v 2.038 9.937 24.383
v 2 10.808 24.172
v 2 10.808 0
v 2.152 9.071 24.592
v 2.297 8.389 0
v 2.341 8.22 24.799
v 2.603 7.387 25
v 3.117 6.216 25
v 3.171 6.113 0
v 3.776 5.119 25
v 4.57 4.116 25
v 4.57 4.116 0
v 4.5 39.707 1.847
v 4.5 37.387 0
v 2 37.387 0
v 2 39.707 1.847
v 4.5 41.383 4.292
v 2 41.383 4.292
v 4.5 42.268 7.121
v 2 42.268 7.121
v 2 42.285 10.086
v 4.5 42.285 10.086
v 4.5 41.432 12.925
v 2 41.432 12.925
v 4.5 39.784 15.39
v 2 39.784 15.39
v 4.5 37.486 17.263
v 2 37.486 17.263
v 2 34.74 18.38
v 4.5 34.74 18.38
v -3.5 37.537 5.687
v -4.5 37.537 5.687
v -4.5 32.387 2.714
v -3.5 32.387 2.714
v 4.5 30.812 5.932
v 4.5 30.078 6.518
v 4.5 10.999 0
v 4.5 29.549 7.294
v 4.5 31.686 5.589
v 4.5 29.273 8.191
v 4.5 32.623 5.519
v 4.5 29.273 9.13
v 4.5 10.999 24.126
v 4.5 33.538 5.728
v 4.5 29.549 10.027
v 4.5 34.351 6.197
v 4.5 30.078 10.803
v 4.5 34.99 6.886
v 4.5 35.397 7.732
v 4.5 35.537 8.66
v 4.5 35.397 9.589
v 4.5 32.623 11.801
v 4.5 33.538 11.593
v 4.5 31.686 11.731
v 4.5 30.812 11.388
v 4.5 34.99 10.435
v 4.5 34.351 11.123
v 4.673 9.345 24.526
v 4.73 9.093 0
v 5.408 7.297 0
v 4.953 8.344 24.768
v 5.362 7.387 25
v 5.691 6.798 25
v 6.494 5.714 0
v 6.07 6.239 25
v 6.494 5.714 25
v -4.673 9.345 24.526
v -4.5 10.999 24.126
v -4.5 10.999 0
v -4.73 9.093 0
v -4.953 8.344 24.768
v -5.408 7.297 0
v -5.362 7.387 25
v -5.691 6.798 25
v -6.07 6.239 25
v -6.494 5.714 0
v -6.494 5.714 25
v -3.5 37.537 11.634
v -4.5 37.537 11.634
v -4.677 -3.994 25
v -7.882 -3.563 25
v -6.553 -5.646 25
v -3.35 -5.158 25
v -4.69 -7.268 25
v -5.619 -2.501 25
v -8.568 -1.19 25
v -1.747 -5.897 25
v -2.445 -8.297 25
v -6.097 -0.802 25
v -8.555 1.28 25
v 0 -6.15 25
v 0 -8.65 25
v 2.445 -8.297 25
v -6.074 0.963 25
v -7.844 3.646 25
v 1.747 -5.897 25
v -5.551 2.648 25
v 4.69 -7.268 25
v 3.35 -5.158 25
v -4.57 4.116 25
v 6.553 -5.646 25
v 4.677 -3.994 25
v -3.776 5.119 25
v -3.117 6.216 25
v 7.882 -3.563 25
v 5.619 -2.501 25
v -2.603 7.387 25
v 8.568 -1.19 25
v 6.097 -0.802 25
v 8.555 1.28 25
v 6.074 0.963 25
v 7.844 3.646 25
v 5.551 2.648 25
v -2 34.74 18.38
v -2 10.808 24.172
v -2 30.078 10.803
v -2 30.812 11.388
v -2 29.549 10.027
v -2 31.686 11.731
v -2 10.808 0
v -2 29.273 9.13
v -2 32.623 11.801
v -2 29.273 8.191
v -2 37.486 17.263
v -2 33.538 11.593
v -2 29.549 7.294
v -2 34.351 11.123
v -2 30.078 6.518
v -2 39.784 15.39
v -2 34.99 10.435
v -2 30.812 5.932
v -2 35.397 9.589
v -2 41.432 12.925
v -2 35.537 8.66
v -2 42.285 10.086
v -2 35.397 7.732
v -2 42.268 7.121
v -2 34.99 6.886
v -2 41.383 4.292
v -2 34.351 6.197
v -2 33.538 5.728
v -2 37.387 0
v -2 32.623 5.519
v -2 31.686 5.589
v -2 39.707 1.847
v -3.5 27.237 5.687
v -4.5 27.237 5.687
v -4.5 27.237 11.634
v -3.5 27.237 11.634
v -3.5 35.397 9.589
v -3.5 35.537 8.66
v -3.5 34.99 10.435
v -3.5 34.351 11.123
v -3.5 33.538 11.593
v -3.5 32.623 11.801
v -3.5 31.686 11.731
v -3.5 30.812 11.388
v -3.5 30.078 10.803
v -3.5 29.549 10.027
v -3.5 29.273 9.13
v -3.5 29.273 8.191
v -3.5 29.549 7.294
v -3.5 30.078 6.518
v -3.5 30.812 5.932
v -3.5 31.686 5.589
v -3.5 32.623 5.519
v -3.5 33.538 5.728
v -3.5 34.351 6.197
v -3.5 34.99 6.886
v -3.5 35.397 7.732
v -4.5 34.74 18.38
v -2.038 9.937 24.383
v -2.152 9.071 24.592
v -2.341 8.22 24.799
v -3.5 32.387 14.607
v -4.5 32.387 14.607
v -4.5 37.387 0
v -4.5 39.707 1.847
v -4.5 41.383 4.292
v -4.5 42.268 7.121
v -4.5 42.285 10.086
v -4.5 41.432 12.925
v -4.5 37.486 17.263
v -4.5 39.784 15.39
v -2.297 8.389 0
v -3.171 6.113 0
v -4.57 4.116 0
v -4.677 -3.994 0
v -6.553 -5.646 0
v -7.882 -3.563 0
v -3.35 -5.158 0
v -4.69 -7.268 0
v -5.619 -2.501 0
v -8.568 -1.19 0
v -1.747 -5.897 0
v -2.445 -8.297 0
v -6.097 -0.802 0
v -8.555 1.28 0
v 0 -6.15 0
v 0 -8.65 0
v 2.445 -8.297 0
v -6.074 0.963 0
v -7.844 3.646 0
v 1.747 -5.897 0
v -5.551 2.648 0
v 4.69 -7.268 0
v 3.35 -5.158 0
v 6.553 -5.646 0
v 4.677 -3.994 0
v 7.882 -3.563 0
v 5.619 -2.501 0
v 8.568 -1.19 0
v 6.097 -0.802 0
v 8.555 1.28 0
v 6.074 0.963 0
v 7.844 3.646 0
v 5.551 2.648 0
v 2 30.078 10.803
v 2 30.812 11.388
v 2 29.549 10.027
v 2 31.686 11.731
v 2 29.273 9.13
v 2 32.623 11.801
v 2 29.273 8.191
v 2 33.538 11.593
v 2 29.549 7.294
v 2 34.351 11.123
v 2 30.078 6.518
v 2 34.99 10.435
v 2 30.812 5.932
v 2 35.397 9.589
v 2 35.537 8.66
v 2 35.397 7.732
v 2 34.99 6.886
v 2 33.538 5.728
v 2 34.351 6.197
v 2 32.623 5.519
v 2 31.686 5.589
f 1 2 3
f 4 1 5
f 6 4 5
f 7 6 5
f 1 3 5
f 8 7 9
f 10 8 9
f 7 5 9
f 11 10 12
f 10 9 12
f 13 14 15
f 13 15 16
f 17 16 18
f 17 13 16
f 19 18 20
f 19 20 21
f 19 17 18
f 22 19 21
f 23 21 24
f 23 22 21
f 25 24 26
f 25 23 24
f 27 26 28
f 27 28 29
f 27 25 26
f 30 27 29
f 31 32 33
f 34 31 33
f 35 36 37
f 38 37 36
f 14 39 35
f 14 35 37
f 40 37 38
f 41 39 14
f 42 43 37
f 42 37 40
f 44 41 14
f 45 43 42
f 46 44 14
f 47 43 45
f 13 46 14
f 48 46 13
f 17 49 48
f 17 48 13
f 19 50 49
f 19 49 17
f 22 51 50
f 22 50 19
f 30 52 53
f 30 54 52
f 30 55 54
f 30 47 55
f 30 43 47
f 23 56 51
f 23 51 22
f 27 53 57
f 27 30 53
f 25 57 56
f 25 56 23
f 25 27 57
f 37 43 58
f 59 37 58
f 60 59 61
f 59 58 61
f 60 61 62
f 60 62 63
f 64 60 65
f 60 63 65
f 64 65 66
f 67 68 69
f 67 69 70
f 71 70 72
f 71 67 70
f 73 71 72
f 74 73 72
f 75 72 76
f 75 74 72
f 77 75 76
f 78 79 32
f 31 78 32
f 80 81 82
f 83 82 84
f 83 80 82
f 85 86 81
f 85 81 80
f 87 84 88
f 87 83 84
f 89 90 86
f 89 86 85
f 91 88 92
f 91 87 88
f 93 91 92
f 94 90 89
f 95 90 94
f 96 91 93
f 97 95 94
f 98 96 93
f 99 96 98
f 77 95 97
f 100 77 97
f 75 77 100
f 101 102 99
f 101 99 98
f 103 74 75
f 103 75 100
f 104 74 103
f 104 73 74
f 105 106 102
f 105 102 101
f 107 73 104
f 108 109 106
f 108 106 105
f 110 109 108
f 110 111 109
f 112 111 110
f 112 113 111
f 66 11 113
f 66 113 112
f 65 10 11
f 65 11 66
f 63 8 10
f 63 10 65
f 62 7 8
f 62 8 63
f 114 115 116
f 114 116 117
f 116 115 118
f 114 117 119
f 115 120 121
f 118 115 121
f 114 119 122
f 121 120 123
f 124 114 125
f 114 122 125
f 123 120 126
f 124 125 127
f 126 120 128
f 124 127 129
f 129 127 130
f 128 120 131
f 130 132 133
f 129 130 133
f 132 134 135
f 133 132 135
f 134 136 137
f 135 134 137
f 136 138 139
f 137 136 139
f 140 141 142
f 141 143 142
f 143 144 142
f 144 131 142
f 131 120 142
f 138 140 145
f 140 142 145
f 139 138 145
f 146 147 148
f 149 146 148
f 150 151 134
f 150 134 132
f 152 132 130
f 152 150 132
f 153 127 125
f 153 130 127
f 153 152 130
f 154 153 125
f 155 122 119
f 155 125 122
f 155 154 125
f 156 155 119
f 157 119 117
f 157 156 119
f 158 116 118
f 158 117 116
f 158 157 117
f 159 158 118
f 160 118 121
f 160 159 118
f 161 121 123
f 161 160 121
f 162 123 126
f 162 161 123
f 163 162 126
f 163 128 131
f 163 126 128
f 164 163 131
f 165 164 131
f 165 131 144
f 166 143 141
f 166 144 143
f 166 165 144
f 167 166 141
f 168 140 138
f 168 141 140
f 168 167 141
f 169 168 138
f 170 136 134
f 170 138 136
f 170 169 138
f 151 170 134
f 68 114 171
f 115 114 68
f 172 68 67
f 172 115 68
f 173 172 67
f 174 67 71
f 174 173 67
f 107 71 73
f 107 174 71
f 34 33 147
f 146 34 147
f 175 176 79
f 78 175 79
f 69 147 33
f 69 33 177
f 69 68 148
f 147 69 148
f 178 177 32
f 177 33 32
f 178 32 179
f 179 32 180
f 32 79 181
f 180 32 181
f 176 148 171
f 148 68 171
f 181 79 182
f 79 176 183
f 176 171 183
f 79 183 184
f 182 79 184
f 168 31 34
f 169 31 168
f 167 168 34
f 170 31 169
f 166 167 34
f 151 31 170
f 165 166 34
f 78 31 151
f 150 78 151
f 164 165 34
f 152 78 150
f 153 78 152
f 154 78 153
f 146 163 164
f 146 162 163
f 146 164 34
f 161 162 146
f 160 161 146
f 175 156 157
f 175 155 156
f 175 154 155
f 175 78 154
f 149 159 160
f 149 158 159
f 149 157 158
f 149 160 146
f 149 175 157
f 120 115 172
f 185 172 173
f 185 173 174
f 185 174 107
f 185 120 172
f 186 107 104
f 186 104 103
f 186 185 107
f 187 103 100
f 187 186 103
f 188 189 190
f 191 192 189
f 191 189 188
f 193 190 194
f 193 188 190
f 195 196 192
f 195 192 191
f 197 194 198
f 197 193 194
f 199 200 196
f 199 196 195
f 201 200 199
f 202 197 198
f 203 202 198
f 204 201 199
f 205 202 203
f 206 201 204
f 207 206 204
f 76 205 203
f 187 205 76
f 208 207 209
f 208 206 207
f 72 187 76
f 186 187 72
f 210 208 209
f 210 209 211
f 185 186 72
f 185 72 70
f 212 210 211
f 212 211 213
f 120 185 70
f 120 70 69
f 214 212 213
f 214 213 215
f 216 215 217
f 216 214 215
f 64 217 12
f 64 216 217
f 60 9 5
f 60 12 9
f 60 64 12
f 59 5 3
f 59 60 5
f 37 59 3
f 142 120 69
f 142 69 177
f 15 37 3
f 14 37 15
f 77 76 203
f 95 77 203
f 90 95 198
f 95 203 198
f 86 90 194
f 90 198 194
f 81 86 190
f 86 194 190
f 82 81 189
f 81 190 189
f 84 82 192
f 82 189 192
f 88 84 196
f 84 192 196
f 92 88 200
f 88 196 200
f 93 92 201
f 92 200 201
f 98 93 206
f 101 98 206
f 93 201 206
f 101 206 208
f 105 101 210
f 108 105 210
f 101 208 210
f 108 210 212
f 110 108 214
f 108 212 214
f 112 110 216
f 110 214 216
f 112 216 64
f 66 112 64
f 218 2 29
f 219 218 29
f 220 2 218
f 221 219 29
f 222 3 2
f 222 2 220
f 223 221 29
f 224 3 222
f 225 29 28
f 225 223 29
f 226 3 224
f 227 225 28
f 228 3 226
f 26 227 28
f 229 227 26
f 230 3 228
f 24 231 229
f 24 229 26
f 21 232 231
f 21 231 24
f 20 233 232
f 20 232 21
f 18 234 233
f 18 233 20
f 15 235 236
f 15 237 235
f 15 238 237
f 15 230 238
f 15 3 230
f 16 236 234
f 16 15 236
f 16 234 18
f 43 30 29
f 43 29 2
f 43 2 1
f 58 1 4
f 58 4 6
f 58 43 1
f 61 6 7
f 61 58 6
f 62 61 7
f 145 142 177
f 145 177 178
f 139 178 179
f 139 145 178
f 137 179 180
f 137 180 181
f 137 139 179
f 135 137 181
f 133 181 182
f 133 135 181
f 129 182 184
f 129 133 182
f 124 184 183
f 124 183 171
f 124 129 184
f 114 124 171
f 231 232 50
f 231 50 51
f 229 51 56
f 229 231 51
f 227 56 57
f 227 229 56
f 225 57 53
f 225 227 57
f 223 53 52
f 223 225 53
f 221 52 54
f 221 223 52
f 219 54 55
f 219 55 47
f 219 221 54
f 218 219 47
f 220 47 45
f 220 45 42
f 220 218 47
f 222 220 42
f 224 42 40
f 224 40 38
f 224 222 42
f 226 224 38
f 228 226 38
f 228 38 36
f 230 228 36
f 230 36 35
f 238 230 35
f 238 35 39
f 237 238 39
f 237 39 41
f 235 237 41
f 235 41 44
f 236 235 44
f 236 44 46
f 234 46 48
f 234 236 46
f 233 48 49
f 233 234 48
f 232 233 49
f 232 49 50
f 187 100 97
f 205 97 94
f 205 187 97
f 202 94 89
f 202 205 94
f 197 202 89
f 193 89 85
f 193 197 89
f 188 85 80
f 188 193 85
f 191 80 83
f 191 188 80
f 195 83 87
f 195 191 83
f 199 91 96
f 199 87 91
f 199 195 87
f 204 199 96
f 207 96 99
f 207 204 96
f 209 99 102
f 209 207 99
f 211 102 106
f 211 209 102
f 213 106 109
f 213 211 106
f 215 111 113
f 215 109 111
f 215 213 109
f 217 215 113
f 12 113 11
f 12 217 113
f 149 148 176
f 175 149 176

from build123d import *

# Parameters (mm, degrees)
F0_R     = 6.15
F1_DEPTH = 25
F2_R     = 3.15
F3_DEPTH = 4.5
F4_W     = 4
F4_H     = 43.2851596258
F5_DEPTH = 25.001
F6_R     = 8
F7_R     = 10
F8_R     = 3.15
F9_DEPTH = 1


with BuildPart() as f1:
    # F0 (on Top) → F1 (new body)
    with BuildSketch(Plane.XY):
        with BuildLine():
            Line((4.5, 7.3873202178), (-4.5, 7.3873202178))
            ThreePointArc((-4.5, 7.3873202178), (0, -8.65), (4.5, 7.3873202178))
        make_face()
        Circle(F0_R, mode=Mode.SUBTRACT)
    extrude(amount=F1_DEPTH)

    # F2 (on Right) → F3 (join, symmetric)
    with BuildSketch(Plane.YZ):
        with BuildLine():
            Line((34.739792331, 18.3796097241), (7.3873202178, 25))
            Line((7.3873202178, 25), (7.3873202178, 0))
            Line((7.3873202178, 0), (37.3873202178, 0))
            ThreePointArc((37.3873202178, 0), (42.2851596258, 10.0860082429), (34.739792331, 18.3796097241))
        make_face()
        with Locations((32.3873202178, 8.6602540378)):
            Circle(F2_R, mode=Mode.SUBTRACT)
    extrude(amount=F3_DEPTH, both=True)

    # F4 (on Top) → F5 (cut, through all)
    with BuildSketch(Plane.XY):
        with Locations((0, 21.6425798129)):
            Rectangle(F4_W, F4_H)
    extrude(amount=F5_DEPTH, mode=Mode.SUBTRACT)

    # F6
    f6_edges = [f1.edges().sort_by_distance(p)[0] for p in [
        (4.5, 7.38732, 12.5),
        (-4.5, 7.38732, 12.5),
    ]]
    fillet(f6_edges, radius=F6_R)

    # F7
    f7_edges = [f1.edges().sort_by_distance(p)[0] for p in [
        (-2, 5.815711, 12.5),
        (2, 5.815711, 12.5),
    ]]
    fillet(f7_edges, radius=F7_R)

    # F8 (on face) → F9 (cut)
    with BuildSketch(Plane(origin=(-4.5, 0, 0), x_dir=(0, -1, 0), z_dir=(-1, 0, 0))):
        Polygon((-37.5373202178, 11.6336079242), (-37.5373202178, 5.6869001515), (-32.3873202178, 2.7135462652), (-27.2373202178, 5.6869001515), (-27.2373202178, 11.6336079242), (-32.3873202178, 14.6069618105), align=None)
        with Locations((-32.3873202178, 8.6602540378)):
            Circle(F8_R, mode=Mode.SUBTRACT)
    extrude(amount=-F9_DEPTH, mode=Mode.SUBTRACT)


solid = f1.part
